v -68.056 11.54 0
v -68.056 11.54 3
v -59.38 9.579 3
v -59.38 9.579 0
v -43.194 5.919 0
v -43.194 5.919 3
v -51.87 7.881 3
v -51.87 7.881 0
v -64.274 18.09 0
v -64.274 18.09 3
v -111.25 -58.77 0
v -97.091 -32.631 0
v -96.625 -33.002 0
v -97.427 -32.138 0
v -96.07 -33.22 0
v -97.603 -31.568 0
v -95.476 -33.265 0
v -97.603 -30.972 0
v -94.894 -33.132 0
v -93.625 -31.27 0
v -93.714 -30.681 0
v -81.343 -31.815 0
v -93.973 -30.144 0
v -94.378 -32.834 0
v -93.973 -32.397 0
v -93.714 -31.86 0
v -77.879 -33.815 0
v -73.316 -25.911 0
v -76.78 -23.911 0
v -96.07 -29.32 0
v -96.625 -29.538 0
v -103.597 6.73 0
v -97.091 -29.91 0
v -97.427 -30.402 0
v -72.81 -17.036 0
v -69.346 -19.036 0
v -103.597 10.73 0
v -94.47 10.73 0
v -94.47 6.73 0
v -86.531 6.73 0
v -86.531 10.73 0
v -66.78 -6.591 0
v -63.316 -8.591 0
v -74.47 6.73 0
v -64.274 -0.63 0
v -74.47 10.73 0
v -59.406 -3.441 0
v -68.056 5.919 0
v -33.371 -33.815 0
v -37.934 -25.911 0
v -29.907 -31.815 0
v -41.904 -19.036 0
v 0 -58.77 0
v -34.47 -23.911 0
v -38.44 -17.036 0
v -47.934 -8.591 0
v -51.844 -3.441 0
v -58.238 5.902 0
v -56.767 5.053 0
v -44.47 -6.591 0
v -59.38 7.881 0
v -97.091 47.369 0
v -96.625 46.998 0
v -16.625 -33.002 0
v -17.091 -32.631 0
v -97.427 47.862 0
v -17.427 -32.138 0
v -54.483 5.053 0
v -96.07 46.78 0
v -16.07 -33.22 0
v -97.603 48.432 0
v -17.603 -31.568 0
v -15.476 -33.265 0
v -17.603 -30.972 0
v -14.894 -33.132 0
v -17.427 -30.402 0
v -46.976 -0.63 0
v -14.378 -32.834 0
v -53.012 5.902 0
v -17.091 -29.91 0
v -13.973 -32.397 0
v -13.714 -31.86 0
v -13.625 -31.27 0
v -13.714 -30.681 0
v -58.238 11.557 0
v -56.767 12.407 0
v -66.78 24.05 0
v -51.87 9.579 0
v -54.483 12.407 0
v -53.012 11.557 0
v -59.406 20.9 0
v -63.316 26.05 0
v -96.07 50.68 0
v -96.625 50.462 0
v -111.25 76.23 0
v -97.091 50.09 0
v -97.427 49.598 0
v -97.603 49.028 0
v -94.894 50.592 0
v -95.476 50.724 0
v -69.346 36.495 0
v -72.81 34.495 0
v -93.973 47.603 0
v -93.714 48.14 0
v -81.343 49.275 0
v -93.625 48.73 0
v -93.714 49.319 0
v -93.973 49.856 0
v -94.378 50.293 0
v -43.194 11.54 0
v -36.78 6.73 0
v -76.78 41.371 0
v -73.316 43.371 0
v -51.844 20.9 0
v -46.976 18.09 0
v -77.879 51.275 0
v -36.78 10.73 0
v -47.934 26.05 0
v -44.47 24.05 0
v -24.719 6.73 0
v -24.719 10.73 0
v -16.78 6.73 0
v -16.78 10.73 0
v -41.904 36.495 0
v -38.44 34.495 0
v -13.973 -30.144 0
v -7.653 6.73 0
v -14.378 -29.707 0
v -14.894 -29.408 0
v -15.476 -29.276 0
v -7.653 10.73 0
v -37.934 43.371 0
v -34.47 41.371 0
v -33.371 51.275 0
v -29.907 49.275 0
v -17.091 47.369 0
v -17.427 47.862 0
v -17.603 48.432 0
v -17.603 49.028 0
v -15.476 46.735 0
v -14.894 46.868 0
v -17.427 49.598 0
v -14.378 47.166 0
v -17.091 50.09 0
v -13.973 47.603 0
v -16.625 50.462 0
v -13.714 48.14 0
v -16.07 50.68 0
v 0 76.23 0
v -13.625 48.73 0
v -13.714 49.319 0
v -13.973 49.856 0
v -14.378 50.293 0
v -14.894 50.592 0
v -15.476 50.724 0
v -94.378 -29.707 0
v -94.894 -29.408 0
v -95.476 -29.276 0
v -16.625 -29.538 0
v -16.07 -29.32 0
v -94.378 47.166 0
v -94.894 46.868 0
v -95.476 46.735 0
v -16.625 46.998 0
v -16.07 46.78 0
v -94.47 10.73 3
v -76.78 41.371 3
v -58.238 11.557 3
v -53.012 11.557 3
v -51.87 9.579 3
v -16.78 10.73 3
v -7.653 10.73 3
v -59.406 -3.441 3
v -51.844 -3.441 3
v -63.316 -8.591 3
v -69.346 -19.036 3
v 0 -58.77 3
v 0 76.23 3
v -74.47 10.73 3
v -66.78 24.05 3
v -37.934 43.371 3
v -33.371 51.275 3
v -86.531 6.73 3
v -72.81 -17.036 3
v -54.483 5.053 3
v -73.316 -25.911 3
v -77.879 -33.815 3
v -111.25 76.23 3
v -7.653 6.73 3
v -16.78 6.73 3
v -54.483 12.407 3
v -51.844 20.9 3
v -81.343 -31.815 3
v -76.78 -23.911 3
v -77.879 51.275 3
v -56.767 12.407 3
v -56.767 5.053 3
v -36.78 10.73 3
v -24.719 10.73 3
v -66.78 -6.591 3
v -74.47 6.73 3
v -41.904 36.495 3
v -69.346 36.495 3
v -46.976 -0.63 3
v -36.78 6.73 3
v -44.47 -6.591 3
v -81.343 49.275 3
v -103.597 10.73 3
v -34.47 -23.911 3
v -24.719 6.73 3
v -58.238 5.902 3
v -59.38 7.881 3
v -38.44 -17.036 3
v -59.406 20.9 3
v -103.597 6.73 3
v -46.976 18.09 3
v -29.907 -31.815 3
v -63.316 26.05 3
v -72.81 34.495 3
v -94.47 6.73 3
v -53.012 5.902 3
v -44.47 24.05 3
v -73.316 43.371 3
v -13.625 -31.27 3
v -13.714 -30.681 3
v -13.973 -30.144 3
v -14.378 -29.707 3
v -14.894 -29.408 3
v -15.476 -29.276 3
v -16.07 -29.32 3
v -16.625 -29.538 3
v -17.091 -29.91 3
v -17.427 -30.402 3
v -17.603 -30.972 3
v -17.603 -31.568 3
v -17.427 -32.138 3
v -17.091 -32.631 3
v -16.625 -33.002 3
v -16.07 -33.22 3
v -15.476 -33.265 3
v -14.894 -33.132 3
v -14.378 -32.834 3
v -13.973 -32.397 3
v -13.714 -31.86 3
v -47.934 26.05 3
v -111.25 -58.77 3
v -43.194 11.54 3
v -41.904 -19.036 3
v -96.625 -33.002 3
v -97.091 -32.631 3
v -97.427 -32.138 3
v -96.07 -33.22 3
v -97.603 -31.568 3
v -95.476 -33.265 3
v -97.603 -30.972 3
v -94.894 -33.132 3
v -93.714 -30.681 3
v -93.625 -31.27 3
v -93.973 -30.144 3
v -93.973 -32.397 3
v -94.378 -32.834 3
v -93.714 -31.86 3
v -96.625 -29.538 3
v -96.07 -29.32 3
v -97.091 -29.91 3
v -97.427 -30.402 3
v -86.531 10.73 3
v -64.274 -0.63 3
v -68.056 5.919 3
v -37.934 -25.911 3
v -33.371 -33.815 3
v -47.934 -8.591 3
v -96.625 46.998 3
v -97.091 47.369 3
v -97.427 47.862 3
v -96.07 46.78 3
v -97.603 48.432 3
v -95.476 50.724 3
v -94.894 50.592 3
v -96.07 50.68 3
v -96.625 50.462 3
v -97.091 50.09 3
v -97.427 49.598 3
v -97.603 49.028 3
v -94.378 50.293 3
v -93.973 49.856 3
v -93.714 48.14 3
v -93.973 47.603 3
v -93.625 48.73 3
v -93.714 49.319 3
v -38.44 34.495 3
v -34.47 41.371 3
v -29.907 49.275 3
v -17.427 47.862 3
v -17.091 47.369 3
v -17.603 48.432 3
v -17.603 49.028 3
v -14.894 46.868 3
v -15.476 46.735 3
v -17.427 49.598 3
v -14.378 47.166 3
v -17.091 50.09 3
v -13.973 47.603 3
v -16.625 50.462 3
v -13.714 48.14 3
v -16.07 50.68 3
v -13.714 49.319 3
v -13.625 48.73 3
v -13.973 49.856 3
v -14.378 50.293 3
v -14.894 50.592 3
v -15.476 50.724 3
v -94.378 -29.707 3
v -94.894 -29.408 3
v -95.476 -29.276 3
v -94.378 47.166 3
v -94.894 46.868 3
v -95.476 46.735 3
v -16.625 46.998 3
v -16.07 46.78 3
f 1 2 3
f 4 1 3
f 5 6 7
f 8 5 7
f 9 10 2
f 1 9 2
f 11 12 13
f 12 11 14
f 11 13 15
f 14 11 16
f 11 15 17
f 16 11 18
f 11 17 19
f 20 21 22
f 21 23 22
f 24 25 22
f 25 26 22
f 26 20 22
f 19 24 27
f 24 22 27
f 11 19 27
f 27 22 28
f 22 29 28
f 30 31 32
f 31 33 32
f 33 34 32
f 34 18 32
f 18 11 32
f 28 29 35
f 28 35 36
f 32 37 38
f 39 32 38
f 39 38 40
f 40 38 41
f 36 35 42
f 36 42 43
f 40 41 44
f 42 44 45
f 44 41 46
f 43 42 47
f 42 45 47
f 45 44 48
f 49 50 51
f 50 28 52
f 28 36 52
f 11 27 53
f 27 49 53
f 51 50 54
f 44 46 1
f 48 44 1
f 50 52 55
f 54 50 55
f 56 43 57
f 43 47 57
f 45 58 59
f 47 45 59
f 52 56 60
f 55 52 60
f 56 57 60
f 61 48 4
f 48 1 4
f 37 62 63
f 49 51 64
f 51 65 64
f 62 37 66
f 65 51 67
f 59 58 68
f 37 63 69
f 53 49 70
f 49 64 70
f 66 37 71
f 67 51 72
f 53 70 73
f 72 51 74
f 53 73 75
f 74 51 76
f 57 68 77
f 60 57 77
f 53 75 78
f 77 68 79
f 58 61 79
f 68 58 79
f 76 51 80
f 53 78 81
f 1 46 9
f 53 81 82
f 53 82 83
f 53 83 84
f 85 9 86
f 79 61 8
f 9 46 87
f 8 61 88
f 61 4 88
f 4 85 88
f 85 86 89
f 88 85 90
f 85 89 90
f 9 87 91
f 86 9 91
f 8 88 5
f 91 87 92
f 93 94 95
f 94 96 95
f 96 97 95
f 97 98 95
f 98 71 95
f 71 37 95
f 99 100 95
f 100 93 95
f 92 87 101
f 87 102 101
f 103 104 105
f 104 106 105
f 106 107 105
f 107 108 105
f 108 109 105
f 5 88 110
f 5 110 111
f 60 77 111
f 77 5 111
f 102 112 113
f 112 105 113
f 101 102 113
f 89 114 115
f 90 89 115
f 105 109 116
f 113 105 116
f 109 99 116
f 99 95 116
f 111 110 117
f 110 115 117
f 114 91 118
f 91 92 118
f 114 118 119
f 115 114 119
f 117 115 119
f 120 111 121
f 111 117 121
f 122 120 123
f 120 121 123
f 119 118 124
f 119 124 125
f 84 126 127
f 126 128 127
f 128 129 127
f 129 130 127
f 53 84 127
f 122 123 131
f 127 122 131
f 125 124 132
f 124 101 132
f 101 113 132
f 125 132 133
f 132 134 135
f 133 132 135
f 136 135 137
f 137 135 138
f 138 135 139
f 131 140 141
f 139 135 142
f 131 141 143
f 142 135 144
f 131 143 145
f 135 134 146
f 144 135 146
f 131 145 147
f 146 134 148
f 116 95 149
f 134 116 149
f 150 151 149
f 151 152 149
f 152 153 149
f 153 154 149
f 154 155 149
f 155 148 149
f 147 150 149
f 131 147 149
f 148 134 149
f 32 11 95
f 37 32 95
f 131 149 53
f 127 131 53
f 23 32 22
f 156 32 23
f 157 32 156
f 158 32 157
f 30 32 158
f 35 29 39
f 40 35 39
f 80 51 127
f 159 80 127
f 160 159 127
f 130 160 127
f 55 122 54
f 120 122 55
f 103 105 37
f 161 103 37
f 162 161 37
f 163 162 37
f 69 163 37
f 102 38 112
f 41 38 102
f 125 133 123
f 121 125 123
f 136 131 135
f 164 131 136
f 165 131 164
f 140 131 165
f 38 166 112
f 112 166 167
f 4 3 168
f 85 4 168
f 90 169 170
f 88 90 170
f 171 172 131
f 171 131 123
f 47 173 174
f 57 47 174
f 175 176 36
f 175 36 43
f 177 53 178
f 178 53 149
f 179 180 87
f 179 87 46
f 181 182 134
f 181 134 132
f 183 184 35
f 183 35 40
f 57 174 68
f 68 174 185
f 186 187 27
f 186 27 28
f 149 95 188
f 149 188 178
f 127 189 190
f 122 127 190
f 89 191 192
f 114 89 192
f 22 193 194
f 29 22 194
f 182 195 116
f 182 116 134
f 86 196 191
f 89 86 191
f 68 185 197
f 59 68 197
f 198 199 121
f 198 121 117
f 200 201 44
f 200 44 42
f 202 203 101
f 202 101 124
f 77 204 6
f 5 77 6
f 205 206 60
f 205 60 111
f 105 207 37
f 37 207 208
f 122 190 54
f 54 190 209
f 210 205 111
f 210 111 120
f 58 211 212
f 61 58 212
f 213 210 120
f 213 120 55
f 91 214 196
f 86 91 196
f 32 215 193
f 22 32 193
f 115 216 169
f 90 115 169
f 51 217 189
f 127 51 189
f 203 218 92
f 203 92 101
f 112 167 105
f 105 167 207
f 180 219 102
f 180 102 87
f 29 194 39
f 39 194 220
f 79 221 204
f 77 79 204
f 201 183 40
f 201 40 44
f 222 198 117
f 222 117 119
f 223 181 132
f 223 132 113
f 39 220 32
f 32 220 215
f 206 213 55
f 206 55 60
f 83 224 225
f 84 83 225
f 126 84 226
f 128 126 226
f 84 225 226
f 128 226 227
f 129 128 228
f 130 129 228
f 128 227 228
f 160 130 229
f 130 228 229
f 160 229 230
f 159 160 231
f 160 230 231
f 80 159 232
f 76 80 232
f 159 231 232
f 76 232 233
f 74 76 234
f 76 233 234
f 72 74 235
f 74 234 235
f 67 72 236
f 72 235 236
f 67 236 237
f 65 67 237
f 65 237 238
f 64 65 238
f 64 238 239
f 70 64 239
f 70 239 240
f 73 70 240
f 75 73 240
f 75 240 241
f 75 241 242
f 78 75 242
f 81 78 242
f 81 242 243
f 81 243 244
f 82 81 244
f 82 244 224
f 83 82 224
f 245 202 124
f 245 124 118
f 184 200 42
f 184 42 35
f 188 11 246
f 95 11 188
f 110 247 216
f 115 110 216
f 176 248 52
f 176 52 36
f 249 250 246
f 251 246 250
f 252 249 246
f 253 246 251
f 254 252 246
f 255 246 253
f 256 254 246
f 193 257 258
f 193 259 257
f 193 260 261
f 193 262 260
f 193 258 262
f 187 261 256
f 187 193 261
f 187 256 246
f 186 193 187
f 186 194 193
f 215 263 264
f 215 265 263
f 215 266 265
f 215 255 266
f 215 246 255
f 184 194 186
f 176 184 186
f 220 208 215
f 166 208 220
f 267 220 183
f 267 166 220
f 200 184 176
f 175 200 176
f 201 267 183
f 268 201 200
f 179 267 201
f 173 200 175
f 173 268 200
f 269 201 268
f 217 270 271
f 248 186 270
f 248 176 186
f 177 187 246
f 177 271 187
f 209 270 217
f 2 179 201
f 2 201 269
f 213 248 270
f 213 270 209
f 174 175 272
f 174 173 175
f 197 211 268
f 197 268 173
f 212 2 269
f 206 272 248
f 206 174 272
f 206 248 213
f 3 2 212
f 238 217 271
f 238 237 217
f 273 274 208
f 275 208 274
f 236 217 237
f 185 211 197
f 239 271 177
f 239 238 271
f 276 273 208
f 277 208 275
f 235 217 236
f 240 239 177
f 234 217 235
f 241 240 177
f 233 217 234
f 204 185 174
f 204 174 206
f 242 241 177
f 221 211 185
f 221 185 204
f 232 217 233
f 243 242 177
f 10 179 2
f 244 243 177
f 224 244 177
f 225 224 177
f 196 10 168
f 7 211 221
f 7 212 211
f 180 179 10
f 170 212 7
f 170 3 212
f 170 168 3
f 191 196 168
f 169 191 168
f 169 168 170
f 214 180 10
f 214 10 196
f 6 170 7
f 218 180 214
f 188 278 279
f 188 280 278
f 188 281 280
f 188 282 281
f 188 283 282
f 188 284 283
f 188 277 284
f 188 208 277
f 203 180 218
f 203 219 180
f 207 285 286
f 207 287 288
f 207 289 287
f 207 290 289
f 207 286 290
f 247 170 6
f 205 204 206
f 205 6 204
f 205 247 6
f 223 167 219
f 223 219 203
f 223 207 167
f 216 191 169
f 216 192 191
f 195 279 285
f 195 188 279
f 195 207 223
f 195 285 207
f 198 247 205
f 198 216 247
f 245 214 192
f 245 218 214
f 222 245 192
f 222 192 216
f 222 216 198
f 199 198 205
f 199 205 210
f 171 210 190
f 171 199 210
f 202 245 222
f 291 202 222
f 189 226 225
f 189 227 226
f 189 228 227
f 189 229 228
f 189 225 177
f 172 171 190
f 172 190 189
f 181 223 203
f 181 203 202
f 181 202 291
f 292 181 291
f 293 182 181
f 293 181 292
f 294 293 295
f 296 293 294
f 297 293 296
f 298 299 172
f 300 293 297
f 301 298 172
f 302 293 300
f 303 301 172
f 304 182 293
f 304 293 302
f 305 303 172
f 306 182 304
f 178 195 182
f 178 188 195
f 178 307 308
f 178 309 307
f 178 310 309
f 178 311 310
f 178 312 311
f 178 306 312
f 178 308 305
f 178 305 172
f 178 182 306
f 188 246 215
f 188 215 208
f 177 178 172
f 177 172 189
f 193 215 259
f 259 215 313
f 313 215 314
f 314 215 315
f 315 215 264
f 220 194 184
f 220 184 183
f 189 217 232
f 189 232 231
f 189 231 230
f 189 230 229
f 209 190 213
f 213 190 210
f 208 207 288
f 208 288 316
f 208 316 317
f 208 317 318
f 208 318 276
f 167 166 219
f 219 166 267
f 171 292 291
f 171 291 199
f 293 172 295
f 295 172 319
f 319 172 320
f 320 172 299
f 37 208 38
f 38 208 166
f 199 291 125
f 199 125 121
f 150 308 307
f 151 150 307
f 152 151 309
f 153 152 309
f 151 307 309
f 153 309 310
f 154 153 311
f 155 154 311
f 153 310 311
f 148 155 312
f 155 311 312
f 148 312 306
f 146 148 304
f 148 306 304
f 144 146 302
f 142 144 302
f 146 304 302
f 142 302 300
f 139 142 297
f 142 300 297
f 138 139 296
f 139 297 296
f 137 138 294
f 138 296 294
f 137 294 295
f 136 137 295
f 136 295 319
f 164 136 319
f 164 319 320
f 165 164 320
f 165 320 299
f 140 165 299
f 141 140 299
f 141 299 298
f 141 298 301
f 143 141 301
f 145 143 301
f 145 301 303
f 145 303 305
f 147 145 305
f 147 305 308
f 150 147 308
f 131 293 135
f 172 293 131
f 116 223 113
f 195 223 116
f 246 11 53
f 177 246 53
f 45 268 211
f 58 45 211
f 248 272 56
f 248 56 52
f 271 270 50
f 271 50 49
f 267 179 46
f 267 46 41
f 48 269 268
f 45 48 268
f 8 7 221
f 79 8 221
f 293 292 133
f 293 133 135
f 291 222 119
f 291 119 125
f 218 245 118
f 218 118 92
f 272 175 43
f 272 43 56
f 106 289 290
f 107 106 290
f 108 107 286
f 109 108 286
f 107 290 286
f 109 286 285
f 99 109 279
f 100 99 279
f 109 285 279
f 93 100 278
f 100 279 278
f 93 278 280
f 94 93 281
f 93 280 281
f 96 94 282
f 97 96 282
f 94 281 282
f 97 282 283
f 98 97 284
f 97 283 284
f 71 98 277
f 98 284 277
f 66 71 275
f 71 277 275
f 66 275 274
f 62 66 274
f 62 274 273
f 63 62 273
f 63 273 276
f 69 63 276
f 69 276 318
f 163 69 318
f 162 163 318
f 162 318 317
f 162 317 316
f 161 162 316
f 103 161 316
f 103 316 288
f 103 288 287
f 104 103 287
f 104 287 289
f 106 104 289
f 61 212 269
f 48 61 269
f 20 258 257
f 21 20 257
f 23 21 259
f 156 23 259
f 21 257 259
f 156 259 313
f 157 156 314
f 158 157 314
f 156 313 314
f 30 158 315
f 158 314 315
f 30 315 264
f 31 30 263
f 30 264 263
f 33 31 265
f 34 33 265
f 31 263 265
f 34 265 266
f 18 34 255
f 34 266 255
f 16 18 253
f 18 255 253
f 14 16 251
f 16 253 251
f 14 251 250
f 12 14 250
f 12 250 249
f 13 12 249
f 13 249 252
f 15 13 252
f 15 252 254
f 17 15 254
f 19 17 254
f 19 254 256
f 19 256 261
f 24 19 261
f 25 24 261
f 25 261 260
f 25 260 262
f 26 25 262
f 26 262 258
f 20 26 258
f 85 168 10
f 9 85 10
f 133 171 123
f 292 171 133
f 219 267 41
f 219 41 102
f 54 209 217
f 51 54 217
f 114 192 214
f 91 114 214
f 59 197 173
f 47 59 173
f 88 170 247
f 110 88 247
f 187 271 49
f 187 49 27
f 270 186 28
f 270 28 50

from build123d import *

# Parameters (mm, degrees)
SKETCH1_W           = 111.25
SKETCH1_H           = 135
BOSS_EXTRUDE1_DEPTH = 3
SKETCH2_R           = 2
CUT_EXTRUDE2_DEPTH  = 10


with BuildPart() as part:
    # Sketch1 → Boss-Extrude1 (new body)
    with BuildSketch(Plane.XY):
        with Locations((-55.625, 8.729765013)):
            Rectangle(SKETCH1_W, SKETCH1_H)
    extrude(amount=BOSS_EXTRUDE1_DEPTH)

    # Sketch2 → Cut-Extrude2 (cut)
    with BuildSketch(Plane.XY.offset(3)):
        Polygon((-81.342935317, 49.274535649), (-103.59676902, 10.729765013), (-94.470299462, 10.729765013), (-76.779700538, 41.370781164), align=None)
        Polygon((-37.934401077, 43.370781164), (-73.315598923, 43.370781164), (-77.878833702, 51.274535649), (-33.371166298, 51.274535649), align=None)
        Polygon((-16.779700538, 10.729765013), (-34.470299462, 41.370781164), (-29.907064683, 49.274535649), (-7.65323098, 10.729765013), align=None)
        Polygon((-29.907064683, -31.815005622), (-7.65323098, 6.729765013), (-16.779700538, 6.729765013), (-34.470299462, -23.911251138), align=None)
        Polygon((-77.878833702, -33.815005622), (-73.315598923, -25.911251138), (-37.934401077, -25.911251138), (-33.371166298, -33.815005622), align=None)
        Polygon((-103.59676902, 6.729765013), (-81.342935317, -31.815005622), (-76.779700538, -23.911251138), (-94.470299462, 6.729765013), align=None)
        Polygon((-66.779700538, 24.050273089), (-74.470299462, 10.729765013), (-86.531050208, 10.729765013), (-72.810075912, 34.495189624), align=None)
        Polygon((-74.470299462, 6.729765013), (-66.779700538, -6.590743063), (-72.810075912, -17.035659598), (-86.531050208, 6.729765013), align=None)
        Polygon((-47.934401077, -8.590743063), (-41.904025704, -19.035659598), (-69.345974296, -19.035659598), (-63.315598923, -8.590743063), align=None)
        Polygon((-38.439924088, -17.035659598), (-44.470299462, -6.590743063), (-36.779700538, 6.729765013), (-24.718949792, 6.729765013), align=None)
        Polygon((-36.779700538, 10.729765013), (-44.470299462, 24.050273089), (-38.439924088, 34.495189624), (-24.718949792, 10.729765013), align=None)
        Polygon((-47.934401077, 26.050273089), (-63.315598923, 26.050273089), (-69.345974296, 36.495189624), (-41.904025704, 36.495189624), align=None)
        Polygon((-54.482668179, 12.406598332), (-51.84377359, 20.900431181), (-59.40622641, 20.900431181), (-56.767331821, 12.406598332), align=None)
        Polygon((-58.238065149, 11.557470049), (-64.274492877, 18.089736226), (-68.055719287, 11.540459968), (-59.38039697, 9.578893296), align=None)
        Polygon((-59.38039697, 7.88063673), (-68.055719287, 5.919070058), (-64.274492877, -0.630206199), (-58.238065149, 5.902059977), align=None)
        Polygon((-56.767331821, 5.052931694), (-59.40622641, -3.440901155), (-51.84377359, -3.440901155), (-54.482668179, 5.052931694), align=None)
        Polygon((-53.011934851, 5.902059977), (-46.975507123, -0.630206199), (-43.194280713, 5.919070058), (-51.86960303, 7.88063673), align=None)
        Polygon((-51.86960303, 9.578893296), (-43.194280713, 11.540459968), (-46.975507123, 18.089736226), (-53.011934851, 11.557470049), align=None)
        with Locations((-15.625, -31.270234987)):
            Circle(SKETCH2_R)
        with Locations((-95.625, -31.270234987)):
            Circle(SKETCH2_R)
        with Locations((-95.625, 48.729765013)):
            Circle(SKETCH2_R)
        with Locations((-15.625, 48.729765013)):
            Circle(SKETCH2_R)
    extrude(amount=-CUT_EXTRUDE2_DEPTH, mode=Mode.SUBTRACT)


solid = part.part
